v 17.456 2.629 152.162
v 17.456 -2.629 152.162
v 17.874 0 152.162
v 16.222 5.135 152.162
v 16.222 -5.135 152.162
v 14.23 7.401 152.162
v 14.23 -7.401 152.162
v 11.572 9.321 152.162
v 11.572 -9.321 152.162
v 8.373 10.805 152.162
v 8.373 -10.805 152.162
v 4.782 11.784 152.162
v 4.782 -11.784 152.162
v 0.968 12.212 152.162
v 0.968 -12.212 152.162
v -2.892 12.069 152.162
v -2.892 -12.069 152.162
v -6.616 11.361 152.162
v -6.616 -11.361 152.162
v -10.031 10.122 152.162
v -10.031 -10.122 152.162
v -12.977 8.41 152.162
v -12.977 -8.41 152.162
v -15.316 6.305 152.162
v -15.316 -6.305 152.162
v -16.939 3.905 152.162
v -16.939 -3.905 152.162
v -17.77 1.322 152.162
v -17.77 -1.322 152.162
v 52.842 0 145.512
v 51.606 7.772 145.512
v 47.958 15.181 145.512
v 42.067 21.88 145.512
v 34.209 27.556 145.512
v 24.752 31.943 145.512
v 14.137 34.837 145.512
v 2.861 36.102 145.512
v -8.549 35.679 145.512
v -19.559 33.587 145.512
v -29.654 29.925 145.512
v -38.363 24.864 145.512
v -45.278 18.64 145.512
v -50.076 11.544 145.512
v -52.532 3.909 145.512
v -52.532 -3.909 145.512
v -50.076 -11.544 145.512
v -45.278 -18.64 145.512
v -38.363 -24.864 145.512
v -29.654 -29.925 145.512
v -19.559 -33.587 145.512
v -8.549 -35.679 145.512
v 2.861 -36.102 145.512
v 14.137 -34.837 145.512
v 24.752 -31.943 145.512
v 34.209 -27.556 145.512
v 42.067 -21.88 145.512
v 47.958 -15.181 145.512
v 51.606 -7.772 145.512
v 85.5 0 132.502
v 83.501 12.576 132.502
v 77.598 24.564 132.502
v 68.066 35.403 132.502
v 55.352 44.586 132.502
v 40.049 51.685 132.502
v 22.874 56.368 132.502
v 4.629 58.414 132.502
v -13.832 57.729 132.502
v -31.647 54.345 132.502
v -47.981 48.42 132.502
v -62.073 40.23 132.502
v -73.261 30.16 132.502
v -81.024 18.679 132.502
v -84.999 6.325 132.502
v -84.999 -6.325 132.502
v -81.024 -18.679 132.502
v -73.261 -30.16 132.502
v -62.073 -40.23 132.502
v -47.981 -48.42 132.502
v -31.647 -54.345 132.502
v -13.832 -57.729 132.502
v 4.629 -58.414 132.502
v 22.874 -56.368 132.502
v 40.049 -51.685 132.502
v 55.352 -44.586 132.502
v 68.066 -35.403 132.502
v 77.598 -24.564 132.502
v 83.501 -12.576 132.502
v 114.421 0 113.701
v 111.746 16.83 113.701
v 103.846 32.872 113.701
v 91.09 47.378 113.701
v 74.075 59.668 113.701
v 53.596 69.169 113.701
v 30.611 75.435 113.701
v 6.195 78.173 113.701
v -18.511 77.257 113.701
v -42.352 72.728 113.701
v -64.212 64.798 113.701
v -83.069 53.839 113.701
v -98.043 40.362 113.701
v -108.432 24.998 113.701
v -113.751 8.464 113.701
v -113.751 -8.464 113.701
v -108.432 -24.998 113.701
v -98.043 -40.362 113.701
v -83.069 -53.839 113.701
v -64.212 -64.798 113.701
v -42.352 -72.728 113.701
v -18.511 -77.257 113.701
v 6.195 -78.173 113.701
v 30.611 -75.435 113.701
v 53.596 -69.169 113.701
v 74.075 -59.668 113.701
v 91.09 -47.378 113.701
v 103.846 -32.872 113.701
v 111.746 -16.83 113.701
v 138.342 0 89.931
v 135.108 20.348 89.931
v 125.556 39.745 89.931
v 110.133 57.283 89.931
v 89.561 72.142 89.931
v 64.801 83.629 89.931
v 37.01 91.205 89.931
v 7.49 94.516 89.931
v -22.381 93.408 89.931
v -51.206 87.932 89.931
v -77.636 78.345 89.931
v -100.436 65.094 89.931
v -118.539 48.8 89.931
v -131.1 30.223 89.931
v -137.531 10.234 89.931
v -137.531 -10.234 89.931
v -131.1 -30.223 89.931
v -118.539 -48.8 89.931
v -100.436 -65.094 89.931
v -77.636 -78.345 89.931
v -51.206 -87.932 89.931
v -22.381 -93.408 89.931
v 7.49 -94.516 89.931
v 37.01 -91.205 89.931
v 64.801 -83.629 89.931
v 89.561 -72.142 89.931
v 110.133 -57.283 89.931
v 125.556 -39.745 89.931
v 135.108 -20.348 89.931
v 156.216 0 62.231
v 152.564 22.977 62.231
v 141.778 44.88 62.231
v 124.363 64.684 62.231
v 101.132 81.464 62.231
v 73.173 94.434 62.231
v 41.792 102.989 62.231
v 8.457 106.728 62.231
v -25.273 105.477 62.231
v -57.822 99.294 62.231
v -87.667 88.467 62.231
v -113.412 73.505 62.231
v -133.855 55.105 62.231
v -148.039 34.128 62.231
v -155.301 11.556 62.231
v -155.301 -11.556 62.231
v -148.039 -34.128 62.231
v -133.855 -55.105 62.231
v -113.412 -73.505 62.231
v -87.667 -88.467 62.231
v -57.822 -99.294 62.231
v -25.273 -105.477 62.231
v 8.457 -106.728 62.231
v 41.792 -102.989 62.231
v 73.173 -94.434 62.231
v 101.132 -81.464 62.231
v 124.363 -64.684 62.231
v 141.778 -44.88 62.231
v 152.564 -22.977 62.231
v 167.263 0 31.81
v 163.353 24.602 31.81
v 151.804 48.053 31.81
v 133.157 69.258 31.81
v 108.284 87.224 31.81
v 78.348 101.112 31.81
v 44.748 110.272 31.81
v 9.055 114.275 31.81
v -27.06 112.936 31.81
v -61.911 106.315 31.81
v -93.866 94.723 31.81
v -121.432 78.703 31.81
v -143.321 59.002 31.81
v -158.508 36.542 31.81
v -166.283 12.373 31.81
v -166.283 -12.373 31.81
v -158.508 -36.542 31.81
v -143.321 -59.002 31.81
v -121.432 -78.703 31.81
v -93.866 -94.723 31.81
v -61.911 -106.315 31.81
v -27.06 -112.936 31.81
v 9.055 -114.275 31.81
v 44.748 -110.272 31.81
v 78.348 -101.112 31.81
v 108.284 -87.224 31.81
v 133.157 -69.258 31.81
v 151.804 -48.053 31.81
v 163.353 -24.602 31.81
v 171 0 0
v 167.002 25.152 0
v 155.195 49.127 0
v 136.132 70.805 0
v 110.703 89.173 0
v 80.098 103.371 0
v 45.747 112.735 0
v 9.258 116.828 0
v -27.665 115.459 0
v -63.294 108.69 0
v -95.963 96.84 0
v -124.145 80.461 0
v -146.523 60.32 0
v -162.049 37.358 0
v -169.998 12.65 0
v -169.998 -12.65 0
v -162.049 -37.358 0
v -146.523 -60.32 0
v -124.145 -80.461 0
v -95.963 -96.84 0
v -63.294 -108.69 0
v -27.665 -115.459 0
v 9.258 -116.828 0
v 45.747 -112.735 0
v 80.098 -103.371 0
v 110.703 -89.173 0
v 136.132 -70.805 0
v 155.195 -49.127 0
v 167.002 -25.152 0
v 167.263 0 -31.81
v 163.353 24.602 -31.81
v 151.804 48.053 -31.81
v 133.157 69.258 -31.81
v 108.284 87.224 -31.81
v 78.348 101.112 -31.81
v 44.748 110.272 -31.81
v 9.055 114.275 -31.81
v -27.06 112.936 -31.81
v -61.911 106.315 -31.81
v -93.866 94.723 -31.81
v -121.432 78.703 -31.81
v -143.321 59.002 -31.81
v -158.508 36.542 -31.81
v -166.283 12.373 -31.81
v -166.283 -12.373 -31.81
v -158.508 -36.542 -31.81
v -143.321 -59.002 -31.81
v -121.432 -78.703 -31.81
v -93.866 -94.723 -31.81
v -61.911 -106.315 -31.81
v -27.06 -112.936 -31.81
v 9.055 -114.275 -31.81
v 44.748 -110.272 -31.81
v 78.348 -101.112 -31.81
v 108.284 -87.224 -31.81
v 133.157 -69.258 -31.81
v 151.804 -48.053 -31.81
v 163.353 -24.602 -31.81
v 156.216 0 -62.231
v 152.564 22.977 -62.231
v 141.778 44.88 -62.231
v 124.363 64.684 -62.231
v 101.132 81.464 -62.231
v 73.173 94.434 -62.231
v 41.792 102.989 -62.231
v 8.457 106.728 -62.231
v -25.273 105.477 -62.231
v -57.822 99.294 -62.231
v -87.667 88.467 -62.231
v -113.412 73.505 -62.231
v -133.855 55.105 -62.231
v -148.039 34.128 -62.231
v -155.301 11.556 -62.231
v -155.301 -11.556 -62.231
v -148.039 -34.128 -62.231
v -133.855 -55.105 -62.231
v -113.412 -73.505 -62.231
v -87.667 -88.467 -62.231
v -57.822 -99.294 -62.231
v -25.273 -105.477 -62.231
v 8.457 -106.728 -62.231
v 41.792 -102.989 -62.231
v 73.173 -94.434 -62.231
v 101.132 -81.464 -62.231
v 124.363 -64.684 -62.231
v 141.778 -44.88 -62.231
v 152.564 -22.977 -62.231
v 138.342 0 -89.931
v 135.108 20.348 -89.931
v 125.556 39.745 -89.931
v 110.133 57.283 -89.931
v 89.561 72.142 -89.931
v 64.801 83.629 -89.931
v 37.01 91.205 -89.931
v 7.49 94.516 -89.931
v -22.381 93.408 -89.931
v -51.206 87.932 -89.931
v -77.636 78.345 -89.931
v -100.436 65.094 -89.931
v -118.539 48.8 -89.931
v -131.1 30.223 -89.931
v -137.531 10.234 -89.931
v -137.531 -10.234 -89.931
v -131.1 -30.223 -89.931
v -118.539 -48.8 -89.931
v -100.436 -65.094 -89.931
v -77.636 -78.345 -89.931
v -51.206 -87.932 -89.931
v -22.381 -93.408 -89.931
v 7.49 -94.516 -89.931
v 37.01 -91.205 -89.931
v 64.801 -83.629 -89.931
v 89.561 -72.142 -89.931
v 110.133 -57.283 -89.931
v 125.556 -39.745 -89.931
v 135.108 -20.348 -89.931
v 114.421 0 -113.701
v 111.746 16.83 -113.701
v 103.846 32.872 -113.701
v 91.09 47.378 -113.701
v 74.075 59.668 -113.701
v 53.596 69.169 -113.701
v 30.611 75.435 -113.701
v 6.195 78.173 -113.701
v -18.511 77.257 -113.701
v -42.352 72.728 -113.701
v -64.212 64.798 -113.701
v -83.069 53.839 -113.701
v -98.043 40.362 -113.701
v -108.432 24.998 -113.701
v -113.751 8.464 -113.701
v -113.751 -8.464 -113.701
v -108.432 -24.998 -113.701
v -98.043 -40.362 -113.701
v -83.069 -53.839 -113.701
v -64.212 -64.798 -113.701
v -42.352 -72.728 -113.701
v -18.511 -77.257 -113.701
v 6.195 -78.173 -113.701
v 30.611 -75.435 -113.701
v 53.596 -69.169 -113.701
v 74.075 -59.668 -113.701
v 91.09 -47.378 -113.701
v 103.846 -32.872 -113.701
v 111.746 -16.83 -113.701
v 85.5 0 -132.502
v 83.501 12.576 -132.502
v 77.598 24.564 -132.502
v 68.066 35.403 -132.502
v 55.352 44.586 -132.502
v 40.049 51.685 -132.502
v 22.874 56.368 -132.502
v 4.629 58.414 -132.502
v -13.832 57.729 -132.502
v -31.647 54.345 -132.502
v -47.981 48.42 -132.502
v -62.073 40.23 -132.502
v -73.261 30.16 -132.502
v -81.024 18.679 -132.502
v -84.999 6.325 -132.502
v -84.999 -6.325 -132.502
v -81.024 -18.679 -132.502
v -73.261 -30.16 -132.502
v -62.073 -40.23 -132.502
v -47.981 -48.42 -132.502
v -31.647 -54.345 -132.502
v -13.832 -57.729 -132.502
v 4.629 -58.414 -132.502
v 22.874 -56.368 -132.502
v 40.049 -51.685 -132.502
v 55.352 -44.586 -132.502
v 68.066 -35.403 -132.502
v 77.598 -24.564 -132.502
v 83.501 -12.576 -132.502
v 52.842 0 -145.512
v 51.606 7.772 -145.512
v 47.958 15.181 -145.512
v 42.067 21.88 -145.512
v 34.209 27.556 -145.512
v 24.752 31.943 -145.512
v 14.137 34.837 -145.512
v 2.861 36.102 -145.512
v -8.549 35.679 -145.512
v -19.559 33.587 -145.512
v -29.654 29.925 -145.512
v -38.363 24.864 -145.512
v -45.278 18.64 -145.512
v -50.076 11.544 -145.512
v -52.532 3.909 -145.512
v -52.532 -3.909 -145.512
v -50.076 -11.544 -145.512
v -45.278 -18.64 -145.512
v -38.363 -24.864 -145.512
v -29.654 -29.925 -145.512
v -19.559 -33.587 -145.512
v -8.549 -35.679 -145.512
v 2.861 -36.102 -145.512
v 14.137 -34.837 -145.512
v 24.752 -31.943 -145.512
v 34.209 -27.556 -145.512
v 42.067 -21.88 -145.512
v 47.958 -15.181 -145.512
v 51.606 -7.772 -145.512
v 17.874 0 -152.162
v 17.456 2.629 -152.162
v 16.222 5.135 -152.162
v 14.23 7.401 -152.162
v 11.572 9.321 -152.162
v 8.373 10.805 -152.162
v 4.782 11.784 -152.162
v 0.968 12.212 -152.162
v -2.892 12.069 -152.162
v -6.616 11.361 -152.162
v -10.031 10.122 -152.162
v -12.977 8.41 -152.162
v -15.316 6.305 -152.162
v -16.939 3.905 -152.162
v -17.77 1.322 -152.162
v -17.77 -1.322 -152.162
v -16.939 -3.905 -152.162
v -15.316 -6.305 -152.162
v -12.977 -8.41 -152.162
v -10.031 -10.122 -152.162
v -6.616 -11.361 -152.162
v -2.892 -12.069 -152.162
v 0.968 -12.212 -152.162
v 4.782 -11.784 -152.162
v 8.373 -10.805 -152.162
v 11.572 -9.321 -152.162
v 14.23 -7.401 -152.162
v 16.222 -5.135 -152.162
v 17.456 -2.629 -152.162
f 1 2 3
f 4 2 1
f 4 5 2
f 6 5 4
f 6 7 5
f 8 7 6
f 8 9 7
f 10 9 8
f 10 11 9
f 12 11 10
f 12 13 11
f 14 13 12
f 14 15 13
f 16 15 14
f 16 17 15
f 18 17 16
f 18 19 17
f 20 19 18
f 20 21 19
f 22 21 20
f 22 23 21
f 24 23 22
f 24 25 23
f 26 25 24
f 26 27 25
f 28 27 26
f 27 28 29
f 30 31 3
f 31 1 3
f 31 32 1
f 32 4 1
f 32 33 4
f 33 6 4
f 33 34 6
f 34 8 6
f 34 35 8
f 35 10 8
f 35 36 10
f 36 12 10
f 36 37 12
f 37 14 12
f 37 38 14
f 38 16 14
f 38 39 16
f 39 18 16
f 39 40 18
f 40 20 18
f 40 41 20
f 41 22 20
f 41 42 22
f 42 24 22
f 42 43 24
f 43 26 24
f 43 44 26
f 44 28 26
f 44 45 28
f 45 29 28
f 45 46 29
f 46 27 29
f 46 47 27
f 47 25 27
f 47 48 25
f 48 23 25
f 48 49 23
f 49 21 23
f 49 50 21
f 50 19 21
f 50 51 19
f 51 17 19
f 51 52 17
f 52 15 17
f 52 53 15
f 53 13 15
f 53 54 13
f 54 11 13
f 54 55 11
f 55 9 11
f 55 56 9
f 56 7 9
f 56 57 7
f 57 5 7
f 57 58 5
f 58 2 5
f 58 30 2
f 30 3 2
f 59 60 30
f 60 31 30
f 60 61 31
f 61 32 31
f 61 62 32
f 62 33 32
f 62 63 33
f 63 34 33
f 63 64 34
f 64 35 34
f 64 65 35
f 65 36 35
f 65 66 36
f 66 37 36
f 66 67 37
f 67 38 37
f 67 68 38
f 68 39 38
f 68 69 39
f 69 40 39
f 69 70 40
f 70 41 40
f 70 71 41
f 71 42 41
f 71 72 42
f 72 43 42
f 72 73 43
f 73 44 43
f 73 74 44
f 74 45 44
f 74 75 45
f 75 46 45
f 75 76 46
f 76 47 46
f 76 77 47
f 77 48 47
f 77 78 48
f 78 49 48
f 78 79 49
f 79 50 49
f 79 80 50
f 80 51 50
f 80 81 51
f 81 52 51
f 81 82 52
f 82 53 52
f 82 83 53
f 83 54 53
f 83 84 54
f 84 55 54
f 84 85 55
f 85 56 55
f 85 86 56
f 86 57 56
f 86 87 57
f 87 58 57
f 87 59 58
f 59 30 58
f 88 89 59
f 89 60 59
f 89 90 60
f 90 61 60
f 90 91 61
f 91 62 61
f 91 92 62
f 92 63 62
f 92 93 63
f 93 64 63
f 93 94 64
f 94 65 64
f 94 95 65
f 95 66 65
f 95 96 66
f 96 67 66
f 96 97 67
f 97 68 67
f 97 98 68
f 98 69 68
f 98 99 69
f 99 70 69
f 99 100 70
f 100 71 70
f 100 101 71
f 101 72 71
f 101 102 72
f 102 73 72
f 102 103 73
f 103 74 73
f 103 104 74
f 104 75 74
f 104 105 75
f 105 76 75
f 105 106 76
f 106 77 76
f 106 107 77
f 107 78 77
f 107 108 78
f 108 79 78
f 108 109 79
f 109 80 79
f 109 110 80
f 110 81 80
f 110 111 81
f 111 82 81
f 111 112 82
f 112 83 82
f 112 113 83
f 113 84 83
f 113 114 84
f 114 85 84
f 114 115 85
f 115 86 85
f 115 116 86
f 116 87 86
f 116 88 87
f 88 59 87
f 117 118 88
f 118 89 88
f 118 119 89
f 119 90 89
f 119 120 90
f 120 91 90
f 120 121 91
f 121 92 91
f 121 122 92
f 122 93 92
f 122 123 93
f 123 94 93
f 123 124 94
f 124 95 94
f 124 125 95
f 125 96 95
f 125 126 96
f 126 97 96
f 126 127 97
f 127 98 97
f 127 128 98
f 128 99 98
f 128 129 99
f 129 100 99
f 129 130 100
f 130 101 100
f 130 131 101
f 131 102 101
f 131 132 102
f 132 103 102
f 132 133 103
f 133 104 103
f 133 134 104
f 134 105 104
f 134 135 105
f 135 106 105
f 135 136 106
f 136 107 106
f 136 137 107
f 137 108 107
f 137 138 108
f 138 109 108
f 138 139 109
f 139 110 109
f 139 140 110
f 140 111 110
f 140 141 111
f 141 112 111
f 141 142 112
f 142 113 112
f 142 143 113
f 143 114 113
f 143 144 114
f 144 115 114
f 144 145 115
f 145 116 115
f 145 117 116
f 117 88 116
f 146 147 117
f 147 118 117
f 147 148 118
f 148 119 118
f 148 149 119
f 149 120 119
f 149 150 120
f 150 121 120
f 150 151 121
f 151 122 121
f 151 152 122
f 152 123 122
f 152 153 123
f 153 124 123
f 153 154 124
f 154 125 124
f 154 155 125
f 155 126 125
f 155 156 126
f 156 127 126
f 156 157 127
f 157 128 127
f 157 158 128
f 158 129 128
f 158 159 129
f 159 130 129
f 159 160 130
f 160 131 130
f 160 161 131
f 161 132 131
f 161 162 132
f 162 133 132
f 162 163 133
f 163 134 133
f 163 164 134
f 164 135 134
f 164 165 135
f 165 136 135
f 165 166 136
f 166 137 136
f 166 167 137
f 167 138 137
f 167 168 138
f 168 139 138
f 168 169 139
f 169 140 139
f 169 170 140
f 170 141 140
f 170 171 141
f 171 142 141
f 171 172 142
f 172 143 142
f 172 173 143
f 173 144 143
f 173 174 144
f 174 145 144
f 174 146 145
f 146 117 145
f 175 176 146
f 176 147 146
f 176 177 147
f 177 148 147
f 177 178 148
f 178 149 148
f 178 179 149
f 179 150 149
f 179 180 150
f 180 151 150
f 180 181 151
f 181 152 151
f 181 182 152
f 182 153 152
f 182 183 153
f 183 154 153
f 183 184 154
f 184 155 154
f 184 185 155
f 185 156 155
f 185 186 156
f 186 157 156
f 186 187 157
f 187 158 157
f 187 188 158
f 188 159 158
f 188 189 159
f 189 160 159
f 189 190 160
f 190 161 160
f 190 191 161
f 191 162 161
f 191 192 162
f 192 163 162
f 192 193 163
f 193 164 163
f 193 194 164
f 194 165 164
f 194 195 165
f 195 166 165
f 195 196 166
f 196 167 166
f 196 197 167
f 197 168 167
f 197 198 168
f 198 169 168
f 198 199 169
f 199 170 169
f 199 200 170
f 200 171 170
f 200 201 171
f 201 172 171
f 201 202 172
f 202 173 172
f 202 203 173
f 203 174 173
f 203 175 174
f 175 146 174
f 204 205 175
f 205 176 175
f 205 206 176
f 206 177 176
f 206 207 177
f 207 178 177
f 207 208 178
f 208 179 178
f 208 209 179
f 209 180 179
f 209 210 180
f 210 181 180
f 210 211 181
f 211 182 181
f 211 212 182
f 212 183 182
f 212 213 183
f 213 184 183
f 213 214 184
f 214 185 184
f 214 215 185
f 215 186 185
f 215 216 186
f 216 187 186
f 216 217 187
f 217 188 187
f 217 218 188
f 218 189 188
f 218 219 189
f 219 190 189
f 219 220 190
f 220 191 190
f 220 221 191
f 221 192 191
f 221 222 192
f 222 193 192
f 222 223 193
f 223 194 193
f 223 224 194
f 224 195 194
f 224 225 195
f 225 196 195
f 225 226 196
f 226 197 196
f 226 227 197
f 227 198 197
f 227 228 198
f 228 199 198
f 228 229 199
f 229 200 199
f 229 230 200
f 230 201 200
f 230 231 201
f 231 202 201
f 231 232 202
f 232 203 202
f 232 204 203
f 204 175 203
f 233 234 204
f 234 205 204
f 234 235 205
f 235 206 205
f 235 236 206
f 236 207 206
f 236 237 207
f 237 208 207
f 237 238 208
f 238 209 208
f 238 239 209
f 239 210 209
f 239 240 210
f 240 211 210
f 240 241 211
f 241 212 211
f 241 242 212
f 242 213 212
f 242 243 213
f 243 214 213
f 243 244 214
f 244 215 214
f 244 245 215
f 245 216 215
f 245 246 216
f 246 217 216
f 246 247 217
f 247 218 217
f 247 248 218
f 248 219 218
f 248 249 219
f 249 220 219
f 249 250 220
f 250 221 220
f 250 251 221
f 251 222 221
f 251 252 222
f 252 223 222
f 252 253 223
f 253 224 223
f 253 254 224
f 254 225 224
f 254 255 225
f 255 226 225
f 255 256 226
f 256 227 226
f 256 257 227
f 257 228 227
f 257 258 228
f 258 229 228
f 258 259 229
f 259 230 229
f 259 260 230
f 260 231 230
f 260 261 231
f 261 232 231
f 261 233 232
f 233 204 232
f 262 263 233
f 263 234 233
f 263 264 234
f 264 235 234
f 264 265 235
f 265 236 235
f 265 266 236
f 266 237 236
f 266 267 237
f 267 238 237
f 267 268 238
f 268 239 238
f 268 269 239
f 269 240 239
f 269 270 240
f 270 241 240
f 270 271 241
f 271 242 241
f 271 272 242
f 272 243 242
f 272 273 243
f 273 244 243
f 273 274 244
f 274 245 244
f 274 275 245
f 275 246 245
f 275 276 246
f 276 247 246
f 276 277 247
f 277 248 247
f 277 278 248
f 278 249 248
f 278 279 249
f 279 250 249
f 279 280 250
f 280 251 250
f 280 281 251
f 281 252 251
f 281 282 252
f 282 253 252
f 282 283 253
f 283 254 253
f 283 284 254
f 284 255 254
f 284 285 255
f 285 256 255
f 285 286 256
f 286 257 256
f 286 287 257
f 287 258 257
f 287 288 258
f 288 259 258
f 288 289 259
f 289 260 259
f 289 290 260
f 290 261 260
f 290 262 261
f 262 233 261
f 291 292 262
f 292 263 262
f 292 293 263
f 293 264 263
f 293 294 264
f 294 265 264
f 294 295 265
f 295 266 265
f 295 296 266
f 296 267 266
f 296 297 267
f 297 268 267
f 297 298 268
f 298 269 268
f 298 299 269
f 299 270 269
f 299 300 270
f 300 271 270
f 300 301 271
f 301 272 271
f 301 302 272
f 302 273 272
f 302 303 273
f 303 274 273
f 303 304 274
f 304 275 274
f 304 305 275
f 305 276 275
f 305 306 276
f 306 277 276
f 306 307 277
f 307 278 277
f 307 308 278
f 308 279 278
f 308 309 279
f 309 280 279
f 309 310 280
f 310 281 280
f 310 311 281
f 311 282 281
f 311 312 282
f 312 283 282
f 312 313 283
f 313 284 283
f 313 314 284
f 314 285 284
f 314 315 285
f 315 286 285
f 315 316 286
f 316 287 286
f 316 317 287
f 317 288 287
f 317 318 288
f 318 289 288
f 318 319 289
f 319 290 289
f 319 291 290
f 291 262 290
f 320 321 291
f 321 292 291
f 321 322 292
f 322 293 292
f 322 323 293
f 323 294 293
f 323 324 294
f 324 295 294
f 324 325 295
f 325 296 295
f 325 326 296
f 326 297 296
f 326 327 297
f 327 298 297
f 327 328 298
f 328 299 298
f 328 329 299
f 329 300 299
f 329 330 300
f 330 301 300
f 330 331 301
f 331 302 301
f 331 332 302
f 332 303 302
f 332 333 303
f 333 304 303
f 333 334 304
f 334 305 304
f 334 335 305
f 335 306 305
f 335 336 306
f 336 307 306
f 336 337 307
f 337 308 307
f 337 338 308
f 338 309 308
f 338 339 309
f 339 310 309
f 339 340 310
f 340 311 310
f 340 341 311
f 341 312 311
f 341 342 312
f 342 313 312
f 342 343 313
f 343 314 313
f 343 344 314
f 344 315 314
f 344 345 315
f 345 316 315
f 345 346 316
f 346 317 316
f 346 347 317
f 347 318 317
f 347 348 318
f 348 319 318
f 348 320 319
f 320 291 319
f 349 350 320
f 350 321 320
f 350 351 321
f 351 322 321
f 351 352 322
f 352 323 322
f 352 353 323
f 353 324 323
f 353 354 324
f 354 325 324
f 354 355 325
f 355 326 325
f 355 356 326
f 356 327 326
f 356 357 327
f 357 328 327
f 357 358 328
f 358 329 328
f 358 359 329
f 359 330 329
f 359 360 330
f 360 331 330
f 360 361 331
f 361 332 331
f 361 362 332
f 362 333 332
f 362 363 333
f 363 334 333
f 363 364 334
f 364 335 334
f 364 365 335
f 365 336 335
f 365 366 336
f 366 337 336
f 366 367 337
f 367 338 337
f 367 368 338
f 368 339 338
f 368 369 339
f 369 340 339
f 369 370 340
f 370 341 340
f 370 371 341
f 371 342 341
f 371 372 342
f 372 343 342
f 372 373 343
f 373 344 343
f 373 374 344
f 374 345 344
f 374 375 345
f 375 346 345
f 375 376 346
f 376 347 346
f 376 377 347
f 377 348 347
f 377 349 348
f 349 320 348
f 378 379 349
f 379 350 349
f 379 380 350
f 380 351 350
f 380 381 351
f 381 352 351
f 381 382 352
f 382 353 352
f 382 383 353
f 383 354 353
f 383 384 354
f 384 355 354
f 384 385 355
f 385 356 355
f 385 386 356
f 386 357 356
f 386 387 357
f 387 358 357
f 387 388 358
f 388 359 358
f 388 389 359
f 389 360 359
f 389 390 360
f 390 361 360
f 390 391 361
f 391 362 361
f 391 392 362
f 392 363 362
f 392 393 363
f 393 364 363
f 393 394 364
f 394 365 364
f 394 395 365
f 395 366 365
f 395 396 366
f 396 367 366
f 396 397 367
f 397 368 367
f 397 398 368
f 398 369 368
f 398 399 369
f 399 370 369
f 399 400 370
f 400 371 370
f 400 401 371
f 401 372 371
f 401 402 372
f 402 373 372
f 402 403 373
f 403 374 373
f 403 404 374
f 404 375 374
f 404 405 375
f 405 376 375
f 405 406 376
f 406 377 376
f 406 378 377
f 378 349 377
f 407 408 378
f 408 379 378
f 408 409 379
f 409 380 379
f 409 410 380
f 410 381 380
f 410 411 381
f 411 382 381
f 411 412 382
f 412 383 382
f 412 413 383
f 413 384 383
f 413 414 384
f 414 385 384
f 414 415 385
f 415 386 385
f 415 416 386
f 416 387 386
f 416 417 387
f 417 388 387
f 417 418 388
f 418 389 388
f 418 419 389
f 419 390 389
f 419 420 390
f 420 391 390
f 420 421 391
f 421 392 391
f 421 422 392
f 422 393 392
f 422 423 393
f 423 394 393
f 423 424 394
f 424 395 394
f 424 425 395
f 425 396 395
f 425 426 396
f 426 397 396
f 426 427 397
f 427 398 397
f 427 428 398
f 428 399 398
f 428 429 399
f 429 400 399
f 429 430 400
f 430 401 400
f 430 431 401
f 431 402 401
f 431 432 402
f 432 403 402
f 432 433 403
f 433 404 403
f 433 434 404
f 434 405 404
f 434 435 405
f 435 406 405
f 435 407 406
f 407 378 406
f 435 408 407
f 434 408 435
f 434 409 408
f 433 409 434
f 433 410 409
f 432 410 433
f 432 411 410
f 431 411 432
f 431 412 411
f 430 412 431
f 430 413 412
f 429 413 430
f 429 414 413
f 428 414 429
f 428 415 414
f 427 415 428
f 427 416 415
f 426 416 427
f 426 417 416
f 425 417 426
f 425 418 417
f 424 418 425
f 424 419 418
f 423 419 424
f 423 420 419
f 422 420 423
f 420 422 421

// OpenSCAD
// Generated by SolidPython 1.0.1 on 2020-07-29 00:46:54


scale(v = [19, 13, 17]) {
	sphere(r = 9);
}
/***********************************************
*********      SolidPython code:      **********
************************************************
 
# import packages: SolidPython
from solid import *
from solid.utils import *
from itertools import chain, combinations, permutations


class Resize:

    def __init__(self, scad_file):
        self.scad_file = scad_file
        #self.scad_file = import_scad(scad_file)
        # cone/cylinder param:
        self.r1 = 0
        self.r2 = 0
        self.h = 0
        # rectangular prism param:
        self.w = 0
        self.l = 0
        # ellipse param:
        self.r = 0

    # import OpenScad code (file name corresponds to shape)


    # classify shape + parameters
    def assign(self, param1, param2, param3):
        if self.scad_file == 'cone.scad':
            self.r1 = param1
            self.r2 = param2
            self.h = param3
        elif self.scad_file == 'cylinder.scad':
            self.r1 = param1
            self.r2 = param2
            self.h = param3
        elif self.scad_file == 'rectangularPrism.scad':
            self.h = param1
            self.l = param2
            self.w = param3
        else:
            self.r = param1
            self.h = param2

    # resize parameters
    def iterate(self):
        x = range(3, 20, 2)
        i = 1
        if self.scad_file == 'cone.scad':
            tempList = list(permutations(x, 2))
            for temp in tempList:
                param1 = temp[0]
                param2 = temp[1]
                filepath = 'produced_scad_files/' + 'cone' + str(param1) + '_' + str(param2) + '_' + '.scad'
                scad_render_to_file(cylinder(h=param1, r1=param2, r2=0), filepath)

        elif self.scad_file == 'cylinder.scad':
            tempList = list(permutations(x, 3))
            for temp in tempList:
                param1 = temp[0]
                param2 = temp[1]
                filepath = 'produced_scad_files/' + 'cylinder' + str(param1) + '_' + str(param2) + '_' + '.scad'
                scad_render_to_file(cylinder(h=param1, r1=param2, r2=param2), filepath)

        elif self.scad_file == 'rectangularPrism.scad':
            tempList = list(permutations(x, 3))
            for temp in tempList:
                param1 = temp[0]
                param2 = temp[1]
                param3 = temp[2]
                filepath = 'produced_scad_files/' + 'rectangularPrism' + str(param1) + '_' + str(param2) + '_' + str(
                    param3) + '.scad'
                scad_render_to_file(cube(size=(param1, param2, param3)), filepath)

        elif self.scad_file == 'ellipse.scad':
            tempList = list(permutations(x, 4))
            for temp in tempList:
                param1 = temp[0]
                param2 = temp[1]
                param3 = temp[2]
                param4 = temp[3]
                filepath = 'produced_scad_files/' + 'ellipse' + str(param1) + '_' + str(param2) + '_' + str(param3) + '_' + str(param4) + '.scad'
                scad_render_to_file(scale([param1, param2, param3])(sphere(r=param4)), filepath)

    def render_to_scadfile(self):
        scad_render_to_file(scad, 'example.scad') 
 
************************************************/
